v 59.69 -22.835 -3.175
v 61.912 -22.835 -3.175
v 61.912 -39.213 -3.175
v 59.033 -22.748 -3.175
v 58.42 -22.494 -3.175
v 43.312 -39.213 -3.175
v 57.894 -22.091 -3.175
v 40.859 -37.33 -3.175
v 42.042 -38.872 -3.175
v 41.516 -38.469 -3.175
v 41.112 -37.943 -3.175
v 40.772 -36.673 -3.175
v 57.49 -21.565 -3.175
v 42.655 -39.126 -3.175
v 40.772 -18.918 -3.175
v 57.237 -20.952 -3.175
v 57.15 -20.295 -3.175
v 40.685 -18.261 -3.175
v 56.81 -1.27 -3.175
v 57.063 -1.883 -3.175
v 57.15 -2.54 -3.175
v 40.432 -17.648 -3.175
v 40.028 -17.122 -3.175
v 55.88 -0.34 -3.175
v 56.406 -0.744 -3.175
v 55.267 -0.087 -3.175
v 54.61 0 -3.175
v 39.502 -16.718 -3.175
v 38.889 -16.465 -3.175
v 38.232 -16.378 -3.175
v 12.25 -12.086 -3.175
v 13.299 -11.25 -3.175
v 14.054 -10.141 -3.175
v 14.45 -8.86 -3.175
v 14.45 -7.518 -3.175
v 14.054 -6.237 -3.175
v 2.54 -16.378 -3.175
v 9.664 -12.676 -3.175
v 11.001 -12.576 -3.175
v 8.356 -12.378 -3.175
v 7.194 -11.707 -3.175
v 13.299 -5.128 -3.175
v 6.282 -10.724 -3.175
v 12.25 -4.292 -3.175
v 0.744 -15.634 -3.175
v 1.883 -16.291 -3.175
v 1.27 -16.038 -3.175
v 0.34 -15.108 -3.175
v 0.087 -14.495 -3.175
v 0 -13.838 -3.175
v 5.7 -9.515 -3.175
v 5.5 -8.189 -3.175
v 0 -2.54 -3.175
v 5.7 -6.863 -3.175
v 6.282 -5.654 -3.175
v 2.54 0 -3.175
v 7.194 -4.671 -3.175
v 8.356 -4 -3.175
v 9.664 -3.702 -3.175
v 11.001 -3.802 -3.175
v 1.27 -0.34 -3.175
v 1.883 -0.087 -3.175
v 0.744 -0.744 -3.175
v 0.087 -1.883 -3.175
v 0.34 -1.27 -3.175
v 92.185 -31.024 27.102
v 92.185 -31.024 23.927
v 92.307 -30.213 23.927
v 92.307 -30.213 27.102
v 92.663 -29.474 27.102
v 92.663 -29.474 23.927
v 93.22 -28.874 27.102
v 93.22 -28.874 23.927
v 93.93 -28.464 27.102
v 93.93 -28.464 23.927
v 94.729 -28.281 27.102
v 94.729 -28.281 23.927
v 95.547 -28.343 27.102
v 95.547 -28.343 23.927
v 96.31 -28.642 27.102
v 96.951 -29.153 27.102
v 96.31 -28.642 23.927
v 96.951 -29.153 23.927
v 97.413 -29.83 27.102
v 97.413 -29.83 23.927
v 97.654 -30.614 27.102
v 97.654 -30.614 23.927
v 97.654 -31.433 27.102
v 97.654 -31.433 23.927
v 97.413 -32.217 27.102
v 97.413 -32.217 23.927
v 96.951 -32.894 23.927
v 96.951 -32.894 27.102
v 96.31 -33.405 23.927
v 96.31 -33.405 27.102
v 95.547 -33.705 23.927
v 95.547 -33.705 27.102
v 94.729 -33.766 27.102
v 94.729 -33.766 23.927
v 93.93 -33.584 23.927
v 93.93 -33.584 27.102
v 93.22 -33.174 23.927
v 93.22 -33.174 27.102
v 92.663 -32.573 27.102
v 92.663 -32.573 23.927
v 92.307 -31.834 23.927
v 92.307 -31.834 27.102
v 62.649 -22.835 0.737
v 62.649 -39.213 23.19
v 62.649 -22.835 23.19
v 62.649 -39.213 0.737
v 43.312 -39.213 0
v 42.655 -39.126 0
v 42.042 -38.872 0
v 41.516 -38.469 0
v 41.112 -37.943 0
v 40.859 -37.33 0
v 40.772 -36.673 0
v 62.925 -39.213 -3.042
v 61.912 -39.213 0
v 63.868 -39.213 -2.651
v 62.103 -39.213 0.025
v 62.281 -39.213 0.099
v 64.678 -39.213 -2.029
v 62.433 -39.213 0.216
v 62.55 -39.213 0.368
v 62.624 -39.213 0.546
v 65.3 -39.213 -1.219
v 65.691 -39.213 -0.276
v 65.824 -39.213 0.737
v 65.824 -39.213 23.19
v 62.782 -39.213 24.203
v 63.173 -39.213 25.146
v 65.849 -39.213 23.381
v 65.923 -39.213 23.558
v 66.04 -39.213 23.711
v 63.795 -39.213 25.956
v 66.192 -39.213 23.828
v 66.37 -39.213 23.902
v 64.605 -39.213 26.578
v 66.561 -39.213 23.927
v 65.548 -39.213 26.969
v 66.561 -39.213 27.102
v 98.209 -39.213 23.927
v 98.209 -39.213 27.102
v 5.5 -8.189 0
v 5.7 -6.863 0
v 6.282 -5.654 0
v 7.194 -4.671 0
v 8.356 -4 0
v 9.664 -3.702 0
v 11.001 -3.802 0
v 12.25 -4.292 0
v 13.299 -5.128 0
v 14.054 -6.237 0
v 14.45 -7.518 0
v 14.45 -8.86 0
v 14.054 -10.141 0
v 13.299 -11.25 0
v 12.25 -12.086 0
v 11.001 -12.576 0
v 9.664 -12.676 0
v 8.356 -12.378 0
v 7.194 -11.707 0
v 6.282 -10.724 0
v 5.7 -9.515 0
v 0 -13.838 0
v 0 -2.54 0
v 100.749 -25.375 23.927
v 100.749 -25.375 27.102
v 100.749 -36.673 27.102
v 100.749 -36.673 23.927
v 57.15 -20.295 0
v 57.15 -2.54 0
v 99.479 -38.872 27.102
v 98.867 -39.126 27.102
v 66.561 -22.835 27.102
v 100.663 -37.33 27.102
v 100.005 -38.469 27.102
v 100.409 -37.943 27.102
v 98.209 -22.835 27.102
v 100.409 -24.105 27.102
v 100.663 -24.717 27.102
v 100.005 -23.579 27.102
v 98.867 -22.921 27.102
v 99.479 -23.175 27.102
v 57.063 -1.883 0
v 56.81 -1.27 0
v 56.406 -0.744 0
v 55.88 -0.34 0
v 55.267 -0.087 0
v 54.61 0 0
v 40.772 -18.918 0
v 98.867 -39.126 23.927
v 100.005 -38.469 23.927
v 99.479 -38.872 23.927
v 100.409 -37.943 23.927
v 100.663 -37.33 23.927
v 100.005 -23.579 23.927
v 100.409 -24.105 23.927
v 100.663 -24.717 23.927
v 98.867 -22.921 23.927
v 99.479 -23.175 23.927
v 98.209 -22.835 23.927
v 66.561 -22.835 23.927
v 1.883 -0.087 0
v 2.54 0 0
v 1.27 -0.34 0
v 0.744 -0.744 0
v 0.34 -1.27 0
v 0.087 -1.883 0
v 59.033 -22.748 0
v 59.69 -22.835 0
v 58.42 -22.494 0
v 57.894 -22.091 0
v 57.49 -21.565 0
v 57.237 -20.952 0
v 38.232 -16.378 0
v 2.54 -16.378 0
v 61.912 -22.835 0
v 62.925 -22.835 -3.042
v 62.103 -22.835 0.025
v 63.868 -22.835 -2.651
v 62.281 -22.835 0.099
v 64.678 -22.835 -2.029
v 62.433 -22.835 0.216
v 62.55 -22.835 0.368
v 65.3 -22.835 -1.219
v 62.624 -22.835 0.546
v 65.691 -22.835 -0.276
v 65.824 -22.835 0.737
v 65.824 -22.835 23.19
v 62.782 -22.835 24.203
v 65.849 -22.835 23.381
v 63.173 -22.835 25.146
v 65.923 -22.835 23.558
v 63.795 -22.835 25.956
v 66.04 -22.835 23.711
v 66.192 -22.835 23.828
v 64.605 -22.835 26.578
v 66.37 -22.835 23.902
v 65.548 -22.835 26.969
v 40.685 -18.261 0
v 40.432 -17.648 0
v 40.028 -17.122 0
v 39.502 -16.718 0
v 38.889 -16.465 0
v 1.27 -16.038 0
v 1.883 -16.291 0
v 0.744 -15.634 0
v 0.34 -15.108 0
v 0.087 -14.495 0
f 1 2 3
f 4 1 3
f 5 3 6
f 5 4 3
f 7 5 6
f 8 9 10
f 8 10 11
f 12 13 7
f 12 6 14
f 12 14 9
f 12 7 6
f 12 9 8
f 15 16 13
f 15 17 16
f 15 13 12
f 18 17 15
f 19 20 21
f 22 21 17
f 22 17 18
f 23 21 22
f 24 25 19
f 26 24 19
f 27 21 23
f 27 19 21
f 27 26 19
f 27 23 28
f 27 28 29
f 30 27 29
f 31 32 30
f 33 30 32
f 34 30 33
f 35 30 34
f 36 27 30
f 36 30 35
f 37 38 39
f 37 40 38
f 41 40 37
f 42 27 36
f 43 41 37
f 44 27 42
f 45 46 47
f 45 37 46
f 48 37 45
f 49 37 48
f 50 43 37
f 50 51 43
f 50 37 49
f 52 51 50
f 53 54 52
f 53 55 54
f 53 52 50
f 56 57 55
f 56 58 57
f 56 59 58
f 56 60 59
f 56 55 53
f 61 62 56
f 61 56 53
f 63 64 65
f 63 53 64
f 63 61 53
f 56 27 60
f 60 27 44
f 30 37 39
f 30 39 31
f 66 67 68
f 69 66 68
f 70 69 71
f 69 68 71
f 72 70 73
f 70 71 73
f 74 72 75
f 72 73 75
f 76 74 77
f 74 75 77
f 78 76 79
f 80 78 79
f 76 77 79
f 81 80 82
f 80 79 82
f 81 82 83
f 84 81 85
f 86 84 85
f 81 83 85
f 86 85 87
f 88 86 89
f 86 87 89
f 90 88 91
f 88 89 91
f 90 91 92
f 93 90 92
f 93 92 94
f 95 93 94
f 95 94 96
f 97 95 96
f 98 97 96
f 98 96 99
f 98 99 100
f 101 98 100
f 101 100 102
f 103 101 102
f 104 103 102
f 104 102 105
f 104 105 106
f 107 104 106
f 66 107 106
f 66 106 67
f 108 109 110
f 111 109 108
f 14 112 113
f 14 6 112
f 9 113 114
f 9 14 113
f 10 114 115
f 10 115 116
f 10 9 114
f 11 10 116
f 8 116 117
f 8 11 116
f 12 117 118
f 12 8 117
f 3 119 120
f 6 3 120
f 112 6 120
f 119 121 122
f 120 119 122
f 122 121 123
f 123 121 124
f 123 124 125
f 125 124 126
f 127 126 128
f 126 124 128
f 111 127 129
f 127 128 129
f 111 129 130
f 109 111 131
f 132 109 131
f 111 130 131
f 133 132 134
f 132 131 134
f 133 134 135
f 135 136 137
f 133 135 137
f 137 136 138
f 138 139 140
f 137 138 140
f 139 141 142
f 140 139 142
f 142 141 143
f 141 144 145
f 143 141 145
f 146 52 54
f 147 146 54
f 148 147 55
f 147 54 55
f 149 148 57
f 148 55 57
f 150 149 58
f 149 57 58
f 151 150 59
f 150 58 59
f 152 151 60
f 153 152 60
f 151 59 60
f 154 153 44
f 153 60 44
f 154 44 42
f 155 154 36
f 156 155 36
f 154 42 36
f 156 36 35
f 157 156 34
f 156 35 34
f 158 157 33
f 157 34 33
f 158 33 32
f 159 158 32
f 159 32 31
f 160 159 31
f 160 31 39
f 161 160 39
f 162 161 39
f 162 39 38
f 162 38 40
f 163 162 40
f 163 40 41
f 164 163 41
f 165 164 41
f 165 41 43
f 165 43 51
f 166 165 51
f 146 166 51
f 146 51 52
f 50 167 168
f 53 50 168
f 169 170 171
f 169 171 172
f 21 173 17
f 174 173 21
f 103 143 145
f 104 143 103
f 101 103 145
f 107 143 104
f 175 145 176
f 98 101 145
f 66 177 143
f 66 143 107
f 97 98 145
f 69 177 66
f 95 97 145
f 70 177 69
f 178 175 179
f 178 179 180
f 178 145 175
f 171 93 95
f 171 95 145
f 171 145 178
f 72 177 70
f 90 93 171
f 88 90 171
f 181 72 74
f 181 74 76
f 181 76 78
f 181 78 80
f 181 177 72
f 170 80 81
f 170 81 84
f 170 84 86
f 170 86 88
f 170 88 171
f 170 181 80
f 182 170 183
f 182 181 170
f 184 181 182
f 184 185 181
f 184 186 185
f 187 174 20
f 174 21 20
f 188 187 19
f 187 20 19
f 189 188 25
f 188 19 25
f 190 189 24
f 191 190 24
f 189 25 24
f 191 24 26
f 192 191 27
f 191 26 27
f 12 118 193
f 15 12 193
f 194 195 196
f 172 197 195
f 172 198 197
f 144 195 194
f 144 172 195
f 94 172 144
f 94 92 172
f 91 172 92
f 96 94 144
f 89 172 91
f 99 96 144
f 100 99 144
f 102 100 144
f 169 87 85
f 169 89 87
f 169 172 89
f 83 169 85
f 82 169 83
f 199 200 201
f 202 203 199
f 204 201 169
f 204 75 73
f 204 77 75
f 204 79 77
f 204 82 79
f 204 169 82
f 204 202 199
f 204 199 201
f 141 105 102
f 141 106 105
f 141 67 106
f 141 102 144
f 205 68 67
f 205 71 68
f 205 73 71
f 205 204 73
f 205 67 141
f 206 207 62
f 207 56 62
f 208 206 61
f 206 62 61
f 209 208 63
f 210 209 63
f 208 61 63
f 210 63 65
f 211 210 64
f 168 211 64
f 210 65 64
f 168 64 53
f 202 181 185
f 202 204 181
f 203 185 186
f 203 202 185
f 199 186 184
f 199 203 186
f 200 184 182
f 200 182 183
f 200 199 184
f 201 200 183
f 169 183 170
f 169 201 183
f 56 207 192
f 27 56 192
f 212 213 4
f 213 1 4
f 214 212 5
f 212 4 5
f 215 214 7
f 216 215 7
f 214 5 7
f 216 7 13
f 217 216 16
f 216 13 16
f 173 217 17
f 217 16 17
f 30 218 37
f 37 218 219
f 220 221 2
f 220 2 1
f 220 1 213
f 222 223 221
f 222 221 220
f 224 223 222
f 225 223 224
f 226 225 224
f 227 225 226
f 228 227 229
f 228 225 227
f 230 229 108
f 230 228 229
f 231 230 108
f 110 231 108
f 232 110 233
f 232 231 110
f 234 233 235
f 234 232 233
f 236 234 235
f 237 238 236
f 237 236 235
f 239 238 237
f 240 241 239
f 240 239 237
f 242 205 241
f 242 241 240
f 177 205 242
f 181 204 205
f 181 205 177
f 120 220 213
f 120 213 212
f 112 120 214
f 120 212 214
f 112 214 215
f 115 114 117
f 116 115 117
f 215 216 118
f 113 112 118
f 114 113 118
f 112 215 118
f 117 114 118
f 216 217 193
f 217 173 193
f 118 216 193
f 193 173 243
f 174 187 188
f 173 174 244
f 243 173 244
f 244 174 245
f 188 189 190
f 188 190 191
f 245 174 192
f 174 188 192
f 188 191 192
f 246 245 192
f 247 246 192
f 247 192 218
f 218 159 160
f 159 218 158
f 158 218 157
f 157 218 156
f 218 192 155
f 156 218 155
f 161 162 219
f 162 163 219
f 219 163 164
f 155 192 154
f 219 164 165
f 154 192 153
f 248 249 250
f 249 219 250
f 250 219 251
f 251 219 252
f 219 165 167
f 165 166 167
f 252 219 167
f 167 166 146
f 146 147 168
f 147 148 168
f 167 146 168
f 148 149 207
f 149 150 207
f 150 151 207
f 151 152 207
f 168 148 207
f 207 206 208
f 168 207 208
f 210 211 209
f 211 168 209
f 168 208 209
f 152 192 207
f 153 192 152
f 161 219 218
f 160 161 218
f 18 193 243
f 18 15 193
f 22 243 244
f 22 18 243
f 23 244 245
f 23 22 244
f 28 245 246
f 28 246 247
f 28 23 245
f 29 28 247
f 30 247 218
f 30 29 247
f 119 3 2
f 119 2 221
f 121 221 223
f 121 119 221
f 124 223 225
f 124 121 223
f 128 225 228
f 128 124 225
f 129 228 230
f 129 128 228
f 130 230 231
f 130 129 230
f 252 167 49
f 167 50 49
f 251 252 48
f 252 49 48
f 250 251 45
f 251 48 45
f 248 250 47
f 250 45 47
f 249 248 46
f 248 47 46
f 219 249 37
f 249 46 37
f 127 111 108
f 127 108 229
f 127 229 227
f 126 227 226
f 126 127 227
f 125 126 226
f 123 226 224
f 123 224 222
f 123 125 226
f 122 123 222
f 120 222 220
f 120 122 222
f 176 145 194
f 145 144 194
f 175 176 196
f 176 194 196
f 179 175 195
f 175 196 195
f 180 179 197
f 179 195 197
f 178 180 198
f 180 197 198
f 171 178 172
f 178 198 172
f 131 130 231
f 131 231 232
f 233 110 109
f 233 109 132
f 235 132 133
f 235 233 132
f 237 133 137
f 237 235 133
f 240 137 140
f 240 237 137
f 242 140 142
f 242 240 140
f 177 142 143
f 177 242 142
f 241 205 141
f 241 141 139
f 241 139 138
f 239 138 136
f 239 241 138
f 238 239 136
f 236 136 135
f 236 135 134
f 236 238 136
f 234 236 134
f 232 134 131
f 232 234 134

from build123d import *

# Parameters (mm, degrees)
BASE_FLANGE1_DEPTH           = 3.175
M8_CLEARANCE_HOLE1_D         = 9
EDGE_FLANGE1_DEPTH           = 16.378
EDGE_FLANGE2_STRIP_W         = 14.1732
EDGE_FLANGE2_STRIP_H         = 3.175
EDGE_FLANGE2_STRIP_CUT_DEPTH = 16.378
EDGE_FLANGE2_DEPTH           = 16.378
M5_CLEARANCE_HOLE1_D         = 5.5
FILLET1_R                    = 2.54


# Sheet-metal steps are written as plain solids
with BuildPart() as part:
    # Sketch1 → Base-Flange1 (new body)
    with BuildSketch(Plane.XY):
        Polygon((0, 0), (57.15, 0), (57.15, -16.378), (57.15, -22.8346), (61.9125, -22.8346), (61.9125, -39.2126), (57.15, -39.2126), (40.772, -39.2126), (40.772, -16.378), (0, -16.378), align=None)
    extrude(amount=-BASE_FLANGE1_DEPTH)

    # M8 Clearance Hole1 (through all)
    with Locations(Plane.XY):
        with Locations((10, -8.189)):
            Hole(M8_CLEARANCE_HOLE1_D / 2)

    # Edge-Flange1 section (across the edge) → Edge-Flange1 (add)
    with BuildSketch(Plane(origin=(62.6491, -39.2126, 0), x_dir=(-1, 0, 0), z_dir=(0, 1, 0))):
        with BuildLine():
            Line((-3.175, 0.7366), (-3.175, 23.9268))
            Line((-3.175, 23.9268), (0, 23.9268))
            Line((0, 23.9268), (0, 0.7366))
            ThreePointArc((0, 0.7366), (0.215745145, 0.215745145), (0.7366, 0))
            Line((0.7366, 0), (0.7366, -3.175))
            ThreePointArc((0.7366, -3.175), (-2.029318885, -2.029318885), (-3.175, 0.7366))
        make_face()
    extrude(amount=EDGE_FLANGE1_DEPTH)

    # Edge-Flange2 strip (across the edge) → Edge-Flange2 strip cut (cut)
    with BuildSketch(Plane(origin=(65.8241, -22.8346, 23.9268), x_dir=(0, 0, -1), z_dir=(0, -1, 0))):
        with Locations((-6.35, -1.5875)):
            Rectangle(EDGE_FLANGE2_STRIP_W, EDGE_FLANGE2_STRIP_H)
    extrude(amount=EDGE_FLANGE2_STRIP_CUT_DEPTH, mode=Mode.SUBTRACT)

    # Edge-Flange2 section (across the edge) → Edge-Flange2 (add)
    with BuildSketch(Plane(origin=(65.8241, -22.8346, 23.9268), x_dir=(0, 0, -1), z_dir=(0, -1, 0))):
        with BuildLine():
            Line((-3.175, 0.7366), (-3.175, 34.925))
            Line((-3.175, 34.925), (0, 34.925))
            Line((0, 34.925), (0, 0.7366))
            ThreePointArc((0, 0.7366), (0.215745145, 0.215745145), (0.7366, 0))
            Line((0.7366, 0), (0.7366, -3.175))
            ThreePointArc((0.7366, -3.175), (-2.029318885, -2.029318885), (-3.175, 0.7366))
        make_face()
    extrude(amount=EDGE_FLANGE2_DEPTH)

    # M5 Clearance Hole1 (through all)
    with Locations(Plane.XY.offset(27.1018)):
        with Locations((94.9349, -31.0236)):
            Hole(M5_CLEARANCE_HOLE1_D / 2)

    # Fillet1
    fillet1_edges = [part.edges().sort_by_distance(p)[0] for p in [
        (0, 0, -1.5875),
        (57.15, 0, -1.5875),
        (57.15, -22.8346, -1.5875),
        (40.772, -39.2126, -1.5875),
        (40.772, -16.378, -1.5875),
        (0, -16.378, -1.5875),
        (100.7491, -22.8346, 25.5143),
        (100.7491, -39.2126, 25.5143),
    ]]
    fillet(fillet1_edges, radius=FILLET1_R)


solid = part.part
